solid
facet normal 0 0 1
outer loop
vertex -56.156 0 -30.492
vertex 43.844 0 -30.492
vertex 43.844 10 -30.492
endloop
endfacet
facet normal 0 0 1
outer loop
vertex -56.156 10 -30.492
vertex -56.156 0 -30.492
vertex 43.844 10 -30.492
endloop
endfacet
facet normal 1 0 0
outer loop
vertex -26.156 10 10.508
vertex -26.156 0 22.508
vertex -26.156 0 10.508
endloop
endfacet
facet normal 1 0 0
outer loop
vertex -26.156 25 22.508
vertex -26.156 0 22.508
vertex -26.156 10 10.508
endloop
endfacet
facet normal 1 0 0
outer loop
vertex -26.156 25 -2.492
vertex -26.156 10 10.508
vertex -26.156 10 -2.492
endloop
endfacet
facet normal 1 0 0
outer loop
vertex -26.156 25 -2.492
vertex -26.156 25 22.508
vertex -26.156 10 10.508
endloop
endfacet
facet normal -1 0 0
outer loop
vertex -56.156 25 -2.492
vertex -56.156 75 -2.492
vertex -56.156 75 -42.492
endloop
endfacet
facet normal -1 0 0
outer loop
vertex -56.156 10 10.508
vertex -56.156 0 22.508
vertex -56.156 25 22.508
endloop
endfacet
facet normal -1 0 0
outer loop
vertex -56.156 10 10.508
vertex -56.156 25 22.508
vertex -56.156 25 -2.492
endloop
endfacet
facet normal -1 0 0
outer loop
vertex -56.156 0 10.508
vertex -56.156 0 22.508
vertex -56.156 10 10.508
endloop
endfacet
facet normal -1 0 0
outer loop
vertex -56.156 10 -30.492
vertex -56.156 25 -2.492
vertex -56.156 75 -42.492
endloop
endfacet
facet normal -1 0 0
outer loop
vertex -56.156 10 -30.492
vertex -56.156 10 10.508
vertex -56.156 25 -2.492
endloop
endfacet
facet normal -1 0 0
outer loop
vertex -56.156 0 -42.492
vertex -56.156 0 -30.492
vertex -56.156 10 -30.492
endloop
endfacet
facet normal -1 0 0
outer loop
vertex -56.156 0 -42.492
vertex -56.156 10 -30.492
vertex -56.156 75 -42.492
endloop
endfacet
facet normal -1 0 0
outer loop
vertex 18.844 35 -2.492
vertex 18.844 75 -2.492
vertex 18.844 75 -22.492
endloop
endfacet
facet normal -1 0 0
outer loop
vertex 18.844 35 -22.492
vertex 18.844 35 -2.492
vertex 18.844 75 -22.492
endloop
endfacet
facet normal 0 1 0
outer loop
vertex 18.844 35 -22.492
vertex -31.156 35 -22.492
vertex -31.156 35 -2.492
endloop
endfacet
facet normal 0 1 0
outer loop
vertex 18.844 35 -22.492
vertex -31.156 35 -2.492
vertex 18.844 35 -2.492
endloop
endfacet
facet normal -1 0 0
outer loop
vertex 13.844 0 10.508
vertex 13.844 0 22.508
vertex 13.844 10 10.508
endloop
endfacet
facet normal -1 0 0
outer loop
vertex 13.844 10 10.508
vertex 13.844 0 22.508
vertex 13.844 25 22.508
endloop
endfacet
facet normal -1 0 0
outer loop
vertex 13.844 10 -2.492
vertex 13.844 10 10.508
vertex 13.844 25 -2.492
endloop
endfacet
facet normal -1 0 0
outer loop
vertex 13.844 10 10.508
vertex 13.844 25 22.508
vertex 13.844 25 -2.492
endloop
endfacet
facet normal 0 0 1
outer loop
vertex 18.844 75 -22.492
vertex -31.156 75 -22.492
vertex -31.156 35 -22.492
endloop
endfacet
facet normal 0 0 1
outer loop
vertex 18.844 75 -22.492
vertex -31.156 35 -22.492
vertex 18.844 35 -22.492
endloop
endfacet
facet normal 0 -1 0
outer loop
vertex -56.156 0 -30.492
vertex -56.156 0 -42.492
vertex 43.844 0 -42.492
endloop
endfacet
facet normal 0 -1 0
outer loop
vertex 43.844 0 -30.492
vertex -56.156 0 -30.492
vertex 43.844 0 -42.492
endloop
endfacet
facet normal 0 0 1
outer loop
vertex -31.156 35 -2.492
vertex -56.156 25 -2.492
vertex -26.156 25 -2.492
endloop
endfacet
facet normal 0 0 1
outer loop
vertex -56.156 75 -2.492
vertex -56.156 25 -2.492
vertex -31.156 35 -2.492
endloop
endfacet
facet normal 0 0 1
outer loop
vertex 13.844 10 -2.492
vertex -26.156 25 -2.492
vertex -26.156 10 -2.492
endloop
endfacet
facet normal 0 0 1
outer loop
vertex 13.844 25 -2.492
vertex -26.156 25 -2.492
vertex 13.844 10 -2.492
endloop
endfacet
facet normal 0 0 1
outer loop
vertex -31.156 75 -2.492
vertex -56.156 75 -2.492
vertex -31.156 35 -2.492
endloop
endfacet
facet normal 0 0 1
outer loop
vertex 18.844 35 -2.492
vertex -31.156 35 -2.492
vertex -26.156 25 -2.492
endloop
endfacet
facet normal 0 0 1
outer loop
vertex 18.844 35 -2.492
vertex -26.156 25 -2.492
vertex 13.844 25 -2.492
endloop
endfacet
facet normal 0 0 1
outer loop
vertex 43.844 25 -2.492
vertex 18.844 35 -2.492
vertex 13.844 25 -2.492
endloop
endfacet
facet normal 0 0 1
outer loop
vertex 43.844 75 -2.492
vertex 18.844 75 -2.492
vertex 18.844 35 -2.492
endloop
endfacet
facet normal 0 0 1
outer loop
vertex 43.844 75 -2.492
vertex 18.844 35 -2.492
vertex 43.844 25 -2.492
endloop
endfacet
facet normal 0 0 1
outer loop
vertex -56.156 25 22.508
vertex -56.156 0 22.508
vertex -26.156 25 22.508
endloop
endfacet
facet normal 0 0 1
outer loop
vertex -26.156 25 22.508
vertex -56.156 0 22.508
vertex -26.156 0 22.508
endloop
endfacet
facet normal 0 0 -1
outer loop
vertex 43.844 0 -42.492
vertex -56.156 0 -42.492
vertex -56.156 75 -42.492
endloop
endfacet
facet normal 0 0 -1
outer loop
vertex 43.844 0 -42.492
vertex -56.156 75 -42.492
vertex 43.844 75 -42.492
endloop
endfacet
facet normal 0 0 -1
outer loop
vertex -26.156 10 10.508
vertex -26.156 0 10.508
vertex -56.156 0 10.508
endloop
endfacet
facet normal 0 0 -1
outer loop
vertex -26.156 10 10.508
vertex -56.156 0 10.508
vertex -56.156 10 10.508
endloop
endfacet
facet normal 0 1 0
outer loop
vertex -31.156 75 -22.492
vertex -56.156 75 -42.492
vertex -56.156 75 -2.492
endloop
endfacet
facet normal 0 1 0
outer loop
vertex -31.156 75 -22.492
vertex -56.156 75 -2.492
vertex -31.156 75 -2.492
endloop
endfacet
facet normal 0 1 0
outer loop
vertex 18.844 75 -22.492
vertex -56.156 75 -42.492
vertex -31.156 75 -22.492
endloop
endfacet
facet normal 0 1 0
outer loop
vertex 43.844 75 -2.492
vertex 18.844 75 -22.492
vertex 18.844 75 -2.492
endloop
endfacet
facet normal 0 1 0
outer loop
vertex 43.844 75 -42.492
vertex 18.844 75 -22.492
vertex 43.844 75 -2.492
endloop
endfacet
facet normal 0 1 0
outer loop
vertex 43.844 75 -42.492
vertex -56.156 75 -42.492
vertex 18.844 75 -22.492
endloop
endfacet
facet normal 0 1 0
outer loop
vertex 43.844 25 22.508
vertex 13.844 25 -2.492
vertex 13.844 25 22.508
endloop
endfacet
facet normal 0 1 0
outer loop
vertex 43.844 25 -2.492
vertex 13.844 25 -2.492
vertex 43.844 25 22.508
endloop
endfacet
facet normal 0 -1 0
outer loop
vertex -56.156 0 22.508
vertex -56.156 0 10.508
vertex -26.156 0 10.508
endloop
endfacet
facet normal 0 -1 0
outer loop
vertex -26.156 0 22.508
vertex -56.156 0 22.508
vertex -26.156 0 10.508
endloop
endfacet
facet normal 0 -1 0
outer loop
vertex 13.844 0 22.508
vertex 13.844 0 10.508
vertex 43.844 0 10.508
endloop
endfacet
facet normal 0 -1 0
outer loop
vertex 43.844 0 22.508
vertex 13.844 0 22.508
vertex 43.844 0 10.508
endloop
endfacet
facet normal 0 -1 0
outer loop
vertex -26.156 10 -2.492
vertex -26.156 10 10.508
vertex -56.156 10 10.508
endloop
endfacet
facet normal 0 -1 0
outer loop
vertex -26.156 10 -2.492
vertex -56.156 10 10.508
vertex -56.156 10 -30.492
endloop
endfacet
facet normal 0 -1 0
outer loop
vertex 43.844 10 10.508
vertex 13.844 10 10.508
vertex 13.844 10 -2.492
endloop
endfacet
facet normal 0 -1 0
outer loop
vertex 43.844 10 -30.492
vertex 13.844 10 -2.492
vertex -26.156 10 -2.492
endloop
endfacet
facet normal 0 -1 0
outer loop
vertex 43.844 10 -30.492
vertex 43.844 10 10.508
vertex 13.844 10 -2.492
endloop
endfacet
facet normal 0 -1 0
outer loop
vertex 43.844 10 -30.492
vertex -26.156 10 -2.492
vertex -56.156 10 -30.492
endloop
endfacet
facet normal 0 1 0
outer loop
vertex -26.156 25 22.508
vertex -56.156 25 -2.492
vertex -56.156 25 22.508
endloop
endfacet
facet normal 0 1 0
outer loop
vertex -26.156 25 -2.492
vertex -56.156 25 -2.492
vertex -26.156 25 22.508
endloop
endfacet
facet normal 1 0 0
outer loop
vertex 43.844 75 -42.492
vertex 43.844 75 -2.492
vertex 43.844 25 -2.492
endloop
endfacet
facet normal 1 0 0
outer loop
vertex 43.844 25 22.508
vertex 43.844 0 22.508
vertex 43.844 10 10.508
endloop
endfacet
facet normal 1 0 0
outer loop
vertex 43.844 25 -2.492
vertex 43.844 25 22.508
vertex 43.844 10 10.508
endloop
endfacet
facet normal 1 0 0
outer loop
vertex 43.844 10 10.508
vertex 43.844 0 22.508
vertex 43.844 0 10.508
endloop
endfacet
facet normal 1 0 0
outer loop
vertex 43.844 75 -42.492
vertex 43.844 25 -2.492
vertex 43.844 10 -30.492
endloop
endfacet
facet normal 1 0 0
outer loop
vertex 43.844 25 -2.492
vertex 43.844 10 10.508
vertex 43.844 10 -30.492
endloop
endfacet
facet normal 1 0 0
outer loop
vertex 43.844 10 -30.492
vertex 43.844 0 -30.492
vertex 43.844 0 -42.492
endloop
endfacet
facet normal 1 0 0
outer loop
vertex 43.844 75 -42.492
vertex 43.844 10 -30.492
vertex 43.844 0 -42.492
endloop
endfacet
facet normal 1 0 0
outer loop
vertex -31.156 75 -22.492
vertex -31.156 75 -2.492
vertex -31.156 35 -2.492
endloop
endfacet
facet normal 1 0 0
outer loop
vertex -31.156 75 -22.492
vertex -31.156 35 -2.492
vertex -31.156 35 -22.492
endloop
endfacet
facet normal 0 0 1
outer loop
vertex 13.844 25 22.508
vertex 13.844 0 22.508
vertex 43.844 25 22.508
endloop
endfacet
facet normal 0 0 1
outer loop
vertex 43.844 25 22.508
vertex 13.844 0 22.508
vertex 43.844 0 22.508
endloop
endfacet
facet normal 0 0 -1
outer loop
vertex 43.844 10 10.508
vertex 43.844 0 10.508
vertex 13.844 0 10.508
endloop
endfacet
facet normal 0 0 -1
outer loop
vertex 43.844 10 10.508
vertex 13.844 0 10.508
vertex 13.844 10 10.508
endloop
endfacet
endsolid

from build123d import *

# Parameters (mm, degrees)
SKETCH1_W               = 100
SKETCH1_H               = 65
BOSS_EXTRUDE1_DEPTH     = 75
SKETCH5_W               = 41
SKETCH5_H               = 10
CUT_EXTRUDE1_DEPTH      = 141
SKETCH6_OUTSIDE_W       = 130.178
SKETCH6_OUTSIDE_H       = 95.178
SKETCH6_OUTSIDE_W_2     = 100
SKETCH6_OUTSIDE_H_2     = 40
CUT_EXTRUDE2_DEPTH      = 1
CUT_EXTRUDE2_DEPTH_BACK = 50
SKETCH7_W               = 50
SKETCH7_H               = 20
CUT_EXTRUDE3_DEPTH      = 40
SKETCH10_W              = 40
SKETCH10_H              = 25
CUT_EXTRUDE4_DEPTH      = 40


with BuildPart() as part:
    # Sketch1 → Boss-Extrude1 (new body)
    with BuildSketch(Plane(origin=(0, 0, 0), x_dir=(1, 0, 0), z_dir=(0, 1, 0))):
        with Locations((-6.156156156, 9.992492492)):
            Rectangle(SKETCH1_W, SKETCH1_H)
    extrude(amount=BOSS_EXTRUDE1_DEPTH)

    # Sketch5 → Cut-Extrude1 (cut)
    with BuildSketch(Plane(origin=(43.843843844, 0, 0), x_dir=(0, 0, -1), z_dir=(1, 0, 0))):
        with Locations((9.992492492, 5)):
            Rectangle(SKETCH5_W, SKETCH5_H)
    extrude(amount=-CUT_EXTRUDE1_DEPTH, mode=Mode.SUBTRACT)

    # Sketch6 outside → Cut-Extrude2 (cut, two sides)
    with BuildSketch(Plane(origin=(0, 75, 0), x_dir=(1, 0, 0), z_dir=(0, 1, 0))) as cut_extrude2_sk:
        with Locations((-6.156, 9.992)):
            Rectangle(SKETCH6_OUTSIDE_W, SKETCH6_OUTSIDE_H)
        with Locations((-6.156156156, 22.492492492)):
            Rectangle(SKETCH6_OUTSIDE_W_2, SKETCH6_OUTSIDE_H_2, mode=Mode.SUBTRACT)
    extrude(amount=CUT_EXTRUDE2_DEPTH, mode=Mode.SUBTRACT)
    extrude(cut_extrude2_sk.sketch, amount=-CUT_EXTRUDE2_DEPTH_BACK, mode=Mode.SUBTRACT)

    # Sketch7 → Cut-Extrude3 (cut)
    with BuildSketch(Plane(origin=(0, 75, 0), x_dir=(1, 0, 0), z_dir=(0, 1, 0))):
        with Locations((-6.156156156, 12.492492492)):
            Rectangle(SKETCH7_W, SKETCH7_H)
    extrude(amount=-CUT_EXTRUDE3_DEPTH, mode=Mode.SUBTRACT)

    # Sketch10 → Cut-Extrude4 (cut)
    with BuildSketch(Plane(origin=(0, 25, 0), x_dir=(1, 0, 0), z_dir=(0, 1, 0))):
        with Locations((-6.156156156, -10.007507508)):
            Rectangle(SKETCH10_W, SKETCH10_H)
    extrude(amount=-CUT_EXTRUDE4_DEPTH, mode=Mode.SUBTRACT)


solid = part.part
